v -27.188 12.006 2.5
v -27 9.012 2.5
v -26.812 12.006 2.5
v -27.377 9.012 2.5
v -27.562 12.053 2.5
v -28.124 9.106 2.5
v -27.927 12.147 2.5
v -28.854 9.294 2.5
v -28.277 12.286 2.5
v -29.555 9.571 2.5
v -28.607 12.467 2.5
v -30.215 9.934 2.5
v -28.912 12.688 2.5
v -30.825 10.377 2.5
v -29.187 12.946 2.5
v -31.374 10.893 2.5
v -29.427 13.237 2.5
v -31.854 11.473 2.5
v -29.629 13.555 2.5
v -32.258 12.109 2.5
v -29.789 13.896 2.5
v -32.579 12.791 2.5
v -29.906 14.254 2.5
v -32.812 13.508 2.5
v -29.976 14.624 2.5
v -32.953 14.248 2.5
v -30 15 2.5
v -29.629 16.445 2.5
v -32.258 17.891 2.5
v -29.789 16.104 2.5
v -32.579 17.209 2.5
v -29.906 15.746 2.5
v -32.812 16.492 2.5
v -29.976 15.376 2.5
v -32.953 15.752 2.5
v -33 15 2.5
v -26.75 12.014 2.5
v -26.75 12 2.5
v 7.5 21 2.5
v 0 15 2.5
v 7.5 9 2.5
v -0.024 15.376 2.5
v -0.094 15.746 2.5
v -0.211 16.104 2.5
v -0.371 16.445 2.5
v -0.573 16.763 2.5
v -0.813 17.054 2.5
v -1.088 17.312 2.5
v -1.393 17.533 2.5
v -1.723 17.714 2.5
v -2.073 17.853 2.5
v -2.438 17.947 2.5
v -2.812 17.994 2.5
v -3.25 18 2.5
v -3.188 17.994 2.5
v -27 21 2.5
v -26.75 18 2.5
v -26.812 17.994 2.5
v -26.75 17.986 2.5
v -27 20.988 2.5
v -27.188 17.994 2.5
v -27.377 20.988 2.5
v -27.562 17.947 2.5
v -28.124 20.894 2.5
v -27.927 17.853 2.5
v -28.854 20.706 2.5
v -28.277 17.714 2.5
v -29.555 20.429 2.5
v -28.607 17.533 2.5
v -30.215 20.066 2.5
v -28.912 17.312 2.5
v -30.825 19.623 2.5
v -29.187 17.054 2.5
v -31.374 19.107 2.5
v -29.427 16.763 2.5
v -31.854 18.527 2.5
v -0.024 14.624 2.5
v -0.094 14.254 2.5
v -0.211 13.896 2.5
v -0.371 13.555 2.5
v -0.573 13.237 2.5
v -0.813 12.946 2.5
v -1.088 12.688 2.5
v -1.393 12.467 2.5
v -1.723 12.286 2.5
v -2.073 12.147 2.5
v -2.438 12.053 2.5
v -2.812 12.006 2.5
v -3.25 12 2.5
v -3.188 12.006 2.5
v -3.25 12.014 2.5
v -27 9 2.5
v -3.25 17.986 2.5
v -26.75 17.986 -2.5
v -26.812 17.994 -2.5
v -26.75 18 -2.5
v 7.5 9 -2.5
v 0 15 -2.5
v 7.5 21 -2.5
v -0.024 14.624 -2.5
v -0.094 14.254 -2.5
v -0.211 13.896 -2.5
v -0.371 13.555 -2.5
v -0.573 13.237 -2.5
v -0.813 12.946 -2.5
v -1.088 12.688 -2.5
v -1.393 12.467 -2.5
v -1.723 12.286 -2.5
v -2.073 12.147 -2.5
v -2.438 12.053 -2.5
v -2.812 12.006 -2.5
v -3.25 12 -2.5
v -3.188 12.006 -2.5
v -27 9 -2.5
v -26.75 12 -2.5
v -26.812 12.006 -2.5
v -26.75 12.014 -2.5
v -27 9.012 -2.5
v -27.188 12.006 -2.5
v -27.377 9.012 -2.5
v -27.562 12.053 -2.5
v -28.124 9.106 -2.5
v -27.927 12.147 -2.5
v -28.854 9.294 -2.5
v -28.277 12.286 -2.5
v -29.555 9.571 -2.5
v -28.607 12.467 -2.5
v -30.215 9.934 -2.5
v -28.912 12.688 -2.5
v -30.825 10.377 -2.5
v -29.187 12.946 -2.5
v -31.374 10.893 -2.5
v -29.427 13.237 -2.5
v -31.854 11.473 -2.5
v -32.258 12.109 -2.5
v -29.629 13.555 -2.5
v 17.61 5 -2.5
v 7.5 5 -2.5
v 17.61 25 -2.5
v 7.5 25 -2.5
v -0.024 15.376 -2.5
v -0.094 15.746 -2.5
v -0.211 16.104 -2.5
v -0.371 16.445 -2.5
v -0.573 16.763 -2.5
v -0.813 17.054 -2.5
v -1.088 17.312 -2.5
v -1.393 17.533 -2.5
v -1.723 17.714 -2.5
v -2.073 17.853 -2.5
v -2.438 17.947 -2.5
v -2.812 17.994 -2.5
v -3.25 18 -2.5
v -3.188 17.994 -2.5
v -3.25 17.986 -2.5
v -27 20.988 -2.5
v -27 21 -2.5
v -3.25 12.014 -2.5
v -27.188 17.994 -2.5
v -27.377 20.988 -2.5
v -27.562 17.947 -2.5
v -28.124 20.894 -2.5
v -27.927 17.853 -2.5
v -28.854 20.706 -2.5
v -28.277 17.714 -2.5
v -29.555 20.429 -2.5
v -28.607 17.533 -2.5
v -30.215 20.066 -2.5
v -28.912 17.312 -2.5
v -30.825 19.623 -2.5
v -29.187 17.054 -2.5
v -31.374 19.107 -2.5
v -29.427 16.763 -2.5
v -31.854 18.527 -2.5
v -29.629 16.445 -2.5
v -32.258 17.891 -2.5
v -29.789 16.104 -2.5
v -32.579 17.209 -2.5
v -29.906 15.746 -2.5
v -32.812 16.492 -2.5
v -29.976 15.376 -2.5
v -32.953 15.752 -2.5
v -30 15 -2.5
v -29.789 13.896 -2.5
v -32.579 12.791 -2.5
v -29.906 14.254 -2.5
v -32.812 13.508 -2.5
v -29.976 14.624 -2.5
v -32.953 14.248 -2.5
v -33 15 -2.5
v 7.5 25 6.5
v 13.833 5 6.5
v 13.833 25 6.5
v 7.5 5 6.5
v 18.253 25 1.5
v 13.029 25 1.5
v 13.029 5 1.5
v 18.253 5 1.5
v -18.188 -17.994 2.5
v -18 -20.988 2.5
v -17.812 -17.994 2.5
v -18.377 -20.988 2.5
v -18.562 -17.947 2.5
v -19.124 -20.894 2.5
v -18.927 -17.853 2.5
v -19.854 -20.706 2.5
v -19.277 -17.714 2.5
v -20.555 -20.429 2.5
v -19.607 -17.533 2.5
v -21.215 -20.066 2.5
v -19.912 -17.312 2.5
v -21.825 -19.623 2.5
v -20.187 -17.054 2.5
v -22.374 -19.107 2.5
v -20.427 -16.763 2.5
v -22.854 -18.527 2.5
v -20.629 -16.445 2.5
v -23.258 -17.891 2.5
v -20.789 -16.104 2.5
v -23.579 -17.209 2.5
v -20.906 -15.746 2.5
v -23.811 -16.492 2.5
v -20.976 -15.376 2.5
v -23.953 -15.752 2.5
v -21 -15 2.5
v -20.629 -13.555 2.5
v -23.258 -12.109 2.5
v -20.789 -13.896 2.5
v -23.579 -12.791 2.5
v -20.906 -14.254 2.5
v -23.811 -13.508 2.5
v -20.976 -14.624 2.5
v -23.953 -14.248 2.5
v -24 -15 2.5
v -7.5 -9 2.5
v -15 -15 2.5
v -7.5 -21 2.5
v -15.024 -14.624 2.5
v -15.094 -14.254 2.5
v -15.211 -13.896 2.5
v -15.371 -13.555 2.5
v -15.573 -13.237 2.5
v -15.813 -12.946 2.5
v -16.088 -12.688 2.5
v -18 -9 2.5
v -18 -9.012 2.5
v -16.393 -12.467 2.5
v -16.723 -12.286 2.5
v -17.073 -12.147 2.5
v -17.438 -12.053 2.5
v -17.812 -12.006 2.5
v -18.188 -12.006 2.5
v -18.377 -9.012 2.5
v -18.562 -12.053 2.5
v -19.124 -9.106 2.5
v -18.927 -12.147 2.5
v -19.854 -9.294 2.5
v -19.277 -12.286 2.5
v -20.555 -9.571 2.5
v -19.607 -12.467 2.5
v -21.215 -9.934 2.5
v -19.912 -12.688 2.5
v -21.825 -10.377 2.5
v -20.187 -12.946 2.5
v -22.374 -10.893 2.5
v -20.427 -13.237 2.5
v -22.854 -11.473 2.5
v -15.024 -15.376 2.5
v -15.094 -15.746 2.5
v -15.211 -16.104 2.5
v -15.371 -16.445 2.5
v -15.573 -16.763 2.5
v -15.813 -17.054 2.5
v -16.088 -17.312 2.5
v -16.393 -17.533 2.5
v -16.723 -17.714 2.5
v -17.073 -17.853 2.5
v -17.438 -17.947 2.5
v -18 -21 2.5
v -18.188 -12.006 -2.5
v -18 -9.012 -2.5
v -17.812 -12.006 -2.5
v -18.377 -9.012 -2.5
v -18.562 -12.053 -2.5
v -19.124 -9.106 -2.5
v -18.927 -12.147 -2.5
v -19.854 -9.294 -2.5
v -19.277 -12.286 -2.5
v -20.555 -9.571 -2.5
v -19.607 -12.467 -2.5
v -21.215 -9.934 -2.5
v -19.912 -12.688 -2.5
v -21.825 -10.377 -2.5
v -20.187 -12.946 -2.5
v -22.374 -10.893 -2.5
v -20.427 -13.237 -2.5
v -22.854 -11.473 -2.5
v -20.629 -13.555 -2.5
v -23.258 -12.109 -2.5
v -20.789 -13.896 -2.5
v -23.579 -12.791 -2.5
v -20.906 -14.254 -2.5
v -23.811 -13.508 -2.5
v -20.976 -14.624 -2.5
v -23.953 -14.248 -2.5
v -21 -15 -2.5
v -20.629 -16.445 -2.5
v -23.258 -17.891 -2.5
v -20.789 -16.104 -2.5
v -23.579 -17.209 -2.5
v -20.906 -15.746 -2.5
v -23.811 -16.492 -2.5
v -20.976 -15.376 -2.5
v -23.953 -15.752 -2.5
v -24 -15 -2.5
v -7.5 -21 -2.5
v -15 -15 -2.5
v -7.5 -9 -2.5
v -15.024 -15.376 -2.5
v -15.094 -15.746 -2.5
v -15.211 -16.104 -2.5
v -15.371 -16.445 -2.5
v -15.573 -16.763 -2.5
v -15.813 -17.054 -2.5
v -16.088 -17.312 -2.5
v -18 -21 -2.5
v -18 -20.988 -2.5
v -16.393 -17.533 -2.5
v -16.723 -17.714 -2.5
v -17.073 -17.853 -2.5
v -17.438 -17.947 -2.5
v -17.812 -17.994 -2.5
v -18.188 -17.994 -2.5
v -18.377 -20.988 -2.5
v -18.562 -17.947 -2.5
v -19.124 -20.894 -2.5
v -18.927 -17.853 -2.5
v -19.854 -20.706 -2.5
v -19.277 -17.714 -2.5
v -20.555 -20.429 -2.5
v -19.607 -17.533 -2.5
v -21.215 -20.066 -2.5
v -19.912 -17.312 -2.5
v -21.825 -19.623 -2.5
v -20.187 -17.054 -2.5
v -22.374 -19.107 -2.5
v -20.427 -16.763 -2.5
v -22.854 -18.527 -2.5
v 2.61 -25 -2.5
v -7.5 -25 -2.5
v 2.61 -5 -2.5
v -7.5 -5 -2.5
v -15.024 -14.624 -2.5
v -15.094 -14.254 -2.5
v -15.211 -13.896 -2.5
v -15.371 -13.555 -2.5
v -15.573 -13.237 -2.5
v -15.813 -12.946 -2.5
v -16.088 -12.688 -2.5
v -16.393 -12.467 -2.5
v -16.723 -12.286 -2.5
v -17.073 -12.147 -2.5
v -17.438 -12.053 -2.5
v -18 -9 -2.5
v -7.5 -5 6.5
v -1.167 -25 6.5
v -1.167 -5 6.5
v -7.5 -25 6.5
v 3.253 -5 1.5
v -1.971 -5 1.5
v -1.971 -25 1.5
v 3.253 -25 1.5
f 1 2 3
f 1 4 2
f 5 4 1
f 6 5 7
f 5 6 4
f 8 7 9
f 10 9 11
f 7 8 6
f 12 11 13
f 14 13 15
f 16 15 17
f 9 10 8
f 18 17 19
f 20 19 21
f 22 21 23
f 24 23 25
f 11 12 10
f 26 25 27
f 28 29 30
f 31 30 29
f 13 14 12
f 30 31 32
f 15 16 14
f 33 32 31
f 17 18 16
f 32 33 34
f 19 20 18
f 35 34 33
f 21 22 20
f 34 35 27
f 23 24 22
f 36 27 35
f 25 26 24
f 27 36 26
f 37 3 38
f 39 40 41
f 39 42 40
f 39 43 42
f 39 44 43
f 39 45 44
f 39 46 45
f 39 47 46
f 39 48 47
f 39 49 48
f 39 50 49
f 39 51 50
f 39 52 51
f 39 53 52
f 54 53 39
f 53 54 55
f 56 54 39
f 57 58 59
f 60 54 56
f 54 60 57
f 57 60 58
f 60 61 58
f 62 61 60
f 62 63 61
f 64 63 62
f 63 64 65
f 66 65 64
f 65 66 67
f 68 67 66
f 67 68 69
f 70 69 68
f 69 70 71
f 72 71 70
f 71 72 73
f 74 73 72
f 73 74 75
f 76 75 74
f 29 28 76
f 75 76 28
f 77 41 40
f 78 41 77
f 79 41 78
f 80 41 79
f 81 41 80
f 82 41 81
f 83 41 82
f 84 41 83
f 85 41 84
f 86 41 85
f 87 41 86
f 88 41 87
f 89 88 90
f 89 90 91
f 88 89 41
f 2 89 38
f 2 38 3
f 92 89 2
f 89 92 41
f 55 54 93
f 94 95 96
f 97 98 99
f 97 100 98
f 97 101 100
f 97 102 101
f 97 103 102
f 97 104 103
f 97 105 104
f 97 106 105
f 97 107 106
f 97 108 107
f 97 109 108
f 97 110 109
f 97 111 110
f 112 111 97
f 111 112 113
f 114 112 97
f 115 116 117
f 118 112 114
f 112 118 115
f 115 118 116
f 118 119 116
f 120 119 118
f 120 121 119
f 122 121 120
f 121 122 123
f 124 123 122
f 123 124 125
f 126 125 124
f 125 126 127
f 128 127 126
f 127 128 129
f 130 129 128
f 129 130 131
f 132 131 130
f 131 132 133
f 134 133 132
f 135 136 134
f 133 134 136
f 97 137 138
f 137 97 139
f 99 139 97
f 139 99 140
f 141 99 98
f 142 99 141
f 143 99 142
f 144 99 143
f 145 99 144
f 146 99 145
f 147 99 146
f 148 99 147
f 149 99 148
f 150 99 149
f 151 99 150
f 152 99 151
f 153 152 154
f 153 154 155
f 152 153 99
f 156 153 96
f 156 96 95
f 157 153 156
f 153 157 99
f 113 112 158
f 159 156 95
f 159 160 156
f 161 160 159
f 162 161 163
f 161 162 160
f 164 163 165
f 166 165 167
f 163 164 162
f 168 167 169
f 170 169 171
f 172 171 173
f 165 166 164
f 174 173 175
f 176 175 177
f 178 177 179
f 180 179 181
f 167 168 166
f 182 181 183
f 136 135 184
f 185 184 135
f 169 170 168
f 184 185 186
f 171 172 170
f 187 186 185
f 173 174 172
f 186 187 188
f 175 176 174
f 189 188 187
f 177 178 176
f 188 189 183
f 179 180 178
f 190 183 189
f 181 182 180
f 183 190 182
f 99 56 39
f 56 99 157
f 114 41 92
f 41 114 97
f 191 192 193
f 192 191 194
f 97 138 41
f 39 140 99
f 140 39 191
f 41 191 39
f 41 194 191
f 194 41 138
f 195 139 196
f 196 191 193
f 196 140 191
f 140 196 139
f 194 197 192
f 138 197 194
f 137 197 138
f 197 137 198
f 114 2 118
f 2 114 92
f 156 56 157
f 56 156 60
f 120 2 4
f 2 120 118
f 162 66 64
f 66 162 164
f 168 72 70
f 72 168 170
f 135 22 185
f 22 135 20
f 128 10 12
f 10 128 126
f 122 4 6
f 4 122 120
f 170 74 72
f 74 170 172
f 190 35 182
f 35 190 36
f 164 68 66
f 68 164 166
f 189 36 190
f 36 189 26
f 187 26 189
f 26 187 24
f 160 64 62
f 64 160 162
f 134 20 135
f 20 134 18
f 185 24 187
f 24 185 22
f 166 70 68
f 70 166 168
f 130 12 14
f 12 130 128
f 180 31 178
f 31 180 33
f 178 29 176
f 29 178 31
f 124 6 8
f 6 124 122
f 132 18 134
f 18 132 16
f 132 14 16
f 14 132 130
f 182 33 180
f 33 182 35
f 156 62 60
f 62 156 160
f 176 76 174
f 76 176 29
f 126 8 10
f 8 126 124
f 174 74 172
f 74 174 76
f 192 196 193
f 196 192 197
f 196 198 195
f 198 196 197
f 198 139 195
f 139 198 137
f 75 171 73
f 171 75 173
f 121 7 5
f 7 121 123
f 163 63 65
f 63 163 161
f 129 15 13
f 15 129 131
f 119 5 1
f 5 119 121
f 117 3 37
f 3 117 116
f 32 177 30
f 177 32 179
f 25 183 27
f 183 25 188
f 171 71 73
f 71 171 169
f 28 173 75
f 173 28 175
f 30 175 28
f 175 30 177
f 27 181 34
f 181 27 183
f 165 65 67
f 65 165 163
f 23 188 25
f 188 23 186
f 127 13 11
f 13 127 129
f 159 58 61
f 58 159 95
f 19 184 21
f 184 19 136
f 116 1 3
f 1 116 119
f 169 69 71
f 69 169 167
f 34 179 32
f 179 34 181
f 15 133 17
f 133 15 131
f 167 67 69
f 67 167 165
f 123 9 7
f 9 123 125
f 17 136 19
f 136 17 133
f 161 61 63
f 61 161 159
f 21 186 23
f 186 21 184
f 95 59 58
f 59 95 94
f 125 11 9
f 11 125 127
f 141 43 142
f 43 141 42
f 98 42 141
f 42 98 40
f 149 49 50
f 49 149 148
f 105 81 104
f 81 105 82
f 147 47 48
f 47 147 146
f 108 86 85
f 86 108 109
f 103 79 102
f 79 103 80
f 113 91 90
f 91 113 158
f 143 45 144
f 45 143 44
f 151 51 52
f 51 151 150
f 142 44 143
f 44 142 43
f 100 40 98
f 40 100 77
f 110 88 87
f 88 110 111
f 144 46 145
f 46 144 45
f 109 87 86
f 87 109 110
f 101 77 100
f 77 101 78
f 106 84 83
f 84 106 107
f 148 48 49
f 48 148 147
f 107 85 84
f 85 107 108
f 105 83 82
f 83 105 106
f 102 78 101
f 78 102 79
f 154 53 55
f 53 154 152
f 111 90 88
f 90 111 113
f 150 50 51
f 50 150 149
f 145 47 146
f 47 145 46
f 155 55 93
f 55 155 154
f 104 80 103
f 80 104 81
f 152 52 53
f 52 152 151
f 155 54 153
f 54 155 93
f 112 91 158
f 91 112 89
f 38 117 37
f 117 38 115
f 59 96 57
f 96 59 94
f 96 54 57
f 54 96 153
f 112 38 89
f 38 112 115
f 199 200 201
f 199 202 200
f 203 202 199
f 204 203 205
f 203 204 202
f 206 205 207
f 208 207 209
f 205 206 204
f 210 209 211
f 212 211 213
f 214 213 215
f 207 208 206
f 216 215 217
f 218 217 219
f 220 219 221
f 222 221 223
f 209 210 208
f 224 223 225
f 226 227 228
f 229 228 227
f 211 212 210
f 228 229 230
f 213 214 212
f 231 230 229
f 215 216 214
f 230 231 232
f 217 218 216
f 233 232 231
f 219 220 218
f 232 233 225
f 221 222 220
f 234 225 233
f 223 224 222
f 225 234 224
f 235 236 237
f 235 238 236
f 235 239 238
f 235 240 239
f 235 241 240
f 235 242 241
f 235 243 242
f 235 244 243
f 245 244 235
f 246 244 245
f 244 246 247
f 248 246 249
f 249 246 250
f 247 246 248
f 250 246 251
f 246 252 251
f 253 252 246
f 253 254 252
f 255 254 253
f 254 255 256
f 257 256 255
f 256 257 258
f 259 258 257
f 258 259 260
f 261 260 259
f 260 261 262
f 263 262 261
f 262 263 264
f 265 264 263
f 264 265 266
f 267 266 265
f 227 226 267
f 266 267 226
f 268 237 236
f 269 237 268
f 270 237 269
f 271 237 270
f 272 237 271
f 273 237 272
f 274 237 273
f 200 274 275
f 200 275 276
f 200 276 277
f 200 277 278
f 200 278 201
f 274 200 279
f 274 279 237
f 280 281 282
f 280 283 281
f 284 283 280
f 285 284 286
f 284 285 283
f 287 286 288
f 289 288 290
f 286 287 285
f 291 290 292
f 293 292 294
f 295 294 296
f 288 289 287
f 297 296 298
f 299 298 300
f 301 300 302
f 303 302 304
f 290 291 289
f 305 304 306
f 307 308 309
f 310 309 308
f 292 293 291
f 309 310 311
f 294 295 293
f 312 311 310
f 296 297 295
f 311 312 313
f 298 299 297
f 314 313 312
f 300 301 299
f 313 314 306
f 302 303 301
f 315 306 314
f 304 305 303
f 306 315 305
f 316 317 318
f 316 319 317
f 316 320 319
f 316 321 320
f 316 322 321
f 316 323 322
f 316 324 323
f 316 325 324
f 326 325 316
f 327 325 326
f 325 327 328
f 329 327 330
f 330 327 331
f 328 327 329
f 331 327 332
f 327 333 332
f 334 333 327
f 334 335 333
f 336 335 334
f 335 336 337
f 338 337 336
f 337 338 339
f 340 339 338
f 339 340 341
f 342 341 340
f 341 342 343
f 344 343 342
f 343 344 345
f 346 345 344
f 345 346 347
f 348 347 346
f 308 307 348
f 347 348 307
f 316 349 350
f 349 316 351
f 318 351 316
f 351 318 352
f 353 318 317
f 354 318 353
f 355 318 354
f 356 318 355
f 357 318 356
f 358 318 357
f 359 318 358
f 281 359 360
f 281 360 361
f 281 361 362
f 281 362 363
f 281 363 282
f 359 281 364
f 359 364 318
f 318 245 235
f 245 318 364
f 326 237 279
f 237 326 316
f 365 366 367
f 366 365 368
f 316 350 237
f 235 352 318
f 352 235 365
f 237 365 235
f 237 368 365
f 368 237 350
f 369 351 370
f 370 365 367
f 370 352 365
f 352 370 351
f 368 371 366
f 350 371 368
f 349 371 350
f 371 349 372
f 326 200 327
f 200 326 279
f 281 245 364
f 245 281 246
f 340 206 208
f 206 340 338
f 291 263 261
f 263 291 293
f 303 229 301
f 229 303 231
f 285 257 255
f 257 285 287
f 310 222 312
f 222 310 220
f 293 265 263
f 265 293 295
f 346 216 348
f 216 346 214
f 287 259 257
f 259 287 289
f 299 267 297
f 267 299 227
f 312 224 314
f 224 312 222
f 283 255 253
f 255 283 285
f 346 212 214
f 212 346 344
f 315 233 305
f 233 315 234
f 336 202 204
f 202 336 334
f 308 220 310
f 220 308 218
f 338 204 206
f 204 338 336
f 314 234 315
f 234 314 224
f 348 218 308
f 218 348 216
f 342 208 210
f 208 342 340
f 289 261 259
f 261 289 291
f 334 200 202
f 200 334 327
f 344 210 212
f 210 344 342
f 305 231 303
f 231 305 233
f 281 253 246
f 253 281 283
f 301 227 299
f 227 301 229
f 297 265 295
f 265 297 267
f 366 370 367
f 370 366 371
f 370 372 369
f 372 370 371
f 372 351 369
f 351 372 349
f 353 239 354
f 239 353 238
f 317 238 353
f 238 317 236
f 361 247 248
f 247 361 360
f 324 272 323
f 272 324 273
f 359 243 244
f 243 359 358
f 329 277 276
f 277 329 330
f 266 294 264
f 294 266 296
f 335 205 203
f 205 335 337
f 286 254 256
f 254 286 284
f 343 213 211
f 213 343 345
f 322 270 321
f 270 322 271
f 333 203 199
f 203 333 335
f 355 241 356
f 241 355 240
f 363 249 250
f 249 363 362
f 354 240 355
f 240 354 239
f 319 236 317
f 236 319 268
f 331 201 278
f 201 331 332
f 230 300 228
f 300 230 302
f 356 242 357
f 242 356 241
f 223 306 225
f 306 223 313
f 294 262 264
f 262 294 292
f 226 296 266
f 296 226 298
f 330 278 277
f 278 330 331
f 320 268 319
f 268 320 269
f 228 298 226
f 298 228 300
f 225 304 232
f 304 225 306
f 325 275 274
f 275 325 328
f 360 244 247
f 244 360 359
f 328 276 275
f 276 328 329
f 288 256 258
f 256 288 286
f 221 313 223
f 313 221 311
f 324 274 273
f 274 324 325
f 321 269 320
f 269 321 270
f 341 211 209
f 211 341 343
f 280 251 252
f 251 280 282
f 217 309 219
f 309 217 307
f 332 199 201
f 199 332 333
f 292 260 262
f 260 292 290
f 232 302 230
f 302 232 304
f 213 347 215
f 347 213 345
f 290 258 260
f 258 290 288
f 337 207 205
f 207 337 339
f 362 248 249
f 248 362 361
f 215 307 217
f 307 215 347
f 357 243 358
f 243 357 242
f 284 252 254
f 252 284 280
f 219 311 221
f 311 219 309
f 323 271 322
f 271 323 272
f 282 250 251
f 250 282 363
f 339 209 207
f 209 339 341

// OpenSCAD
$fn=50;
$holderwidth=20;

translate([0,($holderwidth/2)+5,0]) adjustableedgeholder();
translate([-15,-(($holderwidth/2)+5),0]) edgeholder();

module edgeholder()
{
  difference()
  {
    union()
    {
      translate([0,0,0]) cube([18,12,5],center=true);
      translate([17.5,0,2]) scale([1,$holderwidth/20,1]) cube([20,20,9],center=true);
    }
    translate([30,0,7]) scale([1,$holderwidth/20,1]) rotate([0,0,45]) cylinder(11,24,24-2.5,center=true,$fn=4);
    translate([34.5,0,2.5]) scale([1,$holderwidth/20,1]) rotate([0,0,45]) cylinder(11,24,24-2.5,center=true,$fn=4);
    translate([-3,0,0]) cylinder(10,6/2,6/2,center=true);
    difference()
    {
      translate([-8,0,0]) cube([10,20,10],center=true);
      translate([-3,0,0]) cylinder(10,12/2,12/2,center=true);
    }
  }
}

module adjustableedgeholder()
{
  difference()
  {
    union()
    {
      translate([-10,0,0]) cube([50,12,5],center=true);
      translate([17.5,0,2]) scale([1,$holderwidth/20,1]) cube([20,20,9],center=true);
    }
    translate([30,0,7]) scale([1,$holderwidth/20,1]) rotate([0,0,45]) cylinder(11,24,24-2.5,center=true,$fn=4);
    translate([34.5,0,2.5]) scale([1,$holderwidth/20,1]) rotate([0,0,45]) cylinder(11,24,24-2.5,center=true,$fn=4);
    translate([-27,0,0]) cylinder(10,6/2,6/2,center=true);
    translate([-3,0,0]) cylinder(10,6/2,6/2,center=true);
    translate([-15,0,0]) cube([23.5,6,10],center=true);
    difference()
    {
      translate([-32,0,0]) cube([10,20,10],center=true);
      translate([-27,0,0]) cylinder(10,12/2,12/2,center=true);
    }
  }
}
